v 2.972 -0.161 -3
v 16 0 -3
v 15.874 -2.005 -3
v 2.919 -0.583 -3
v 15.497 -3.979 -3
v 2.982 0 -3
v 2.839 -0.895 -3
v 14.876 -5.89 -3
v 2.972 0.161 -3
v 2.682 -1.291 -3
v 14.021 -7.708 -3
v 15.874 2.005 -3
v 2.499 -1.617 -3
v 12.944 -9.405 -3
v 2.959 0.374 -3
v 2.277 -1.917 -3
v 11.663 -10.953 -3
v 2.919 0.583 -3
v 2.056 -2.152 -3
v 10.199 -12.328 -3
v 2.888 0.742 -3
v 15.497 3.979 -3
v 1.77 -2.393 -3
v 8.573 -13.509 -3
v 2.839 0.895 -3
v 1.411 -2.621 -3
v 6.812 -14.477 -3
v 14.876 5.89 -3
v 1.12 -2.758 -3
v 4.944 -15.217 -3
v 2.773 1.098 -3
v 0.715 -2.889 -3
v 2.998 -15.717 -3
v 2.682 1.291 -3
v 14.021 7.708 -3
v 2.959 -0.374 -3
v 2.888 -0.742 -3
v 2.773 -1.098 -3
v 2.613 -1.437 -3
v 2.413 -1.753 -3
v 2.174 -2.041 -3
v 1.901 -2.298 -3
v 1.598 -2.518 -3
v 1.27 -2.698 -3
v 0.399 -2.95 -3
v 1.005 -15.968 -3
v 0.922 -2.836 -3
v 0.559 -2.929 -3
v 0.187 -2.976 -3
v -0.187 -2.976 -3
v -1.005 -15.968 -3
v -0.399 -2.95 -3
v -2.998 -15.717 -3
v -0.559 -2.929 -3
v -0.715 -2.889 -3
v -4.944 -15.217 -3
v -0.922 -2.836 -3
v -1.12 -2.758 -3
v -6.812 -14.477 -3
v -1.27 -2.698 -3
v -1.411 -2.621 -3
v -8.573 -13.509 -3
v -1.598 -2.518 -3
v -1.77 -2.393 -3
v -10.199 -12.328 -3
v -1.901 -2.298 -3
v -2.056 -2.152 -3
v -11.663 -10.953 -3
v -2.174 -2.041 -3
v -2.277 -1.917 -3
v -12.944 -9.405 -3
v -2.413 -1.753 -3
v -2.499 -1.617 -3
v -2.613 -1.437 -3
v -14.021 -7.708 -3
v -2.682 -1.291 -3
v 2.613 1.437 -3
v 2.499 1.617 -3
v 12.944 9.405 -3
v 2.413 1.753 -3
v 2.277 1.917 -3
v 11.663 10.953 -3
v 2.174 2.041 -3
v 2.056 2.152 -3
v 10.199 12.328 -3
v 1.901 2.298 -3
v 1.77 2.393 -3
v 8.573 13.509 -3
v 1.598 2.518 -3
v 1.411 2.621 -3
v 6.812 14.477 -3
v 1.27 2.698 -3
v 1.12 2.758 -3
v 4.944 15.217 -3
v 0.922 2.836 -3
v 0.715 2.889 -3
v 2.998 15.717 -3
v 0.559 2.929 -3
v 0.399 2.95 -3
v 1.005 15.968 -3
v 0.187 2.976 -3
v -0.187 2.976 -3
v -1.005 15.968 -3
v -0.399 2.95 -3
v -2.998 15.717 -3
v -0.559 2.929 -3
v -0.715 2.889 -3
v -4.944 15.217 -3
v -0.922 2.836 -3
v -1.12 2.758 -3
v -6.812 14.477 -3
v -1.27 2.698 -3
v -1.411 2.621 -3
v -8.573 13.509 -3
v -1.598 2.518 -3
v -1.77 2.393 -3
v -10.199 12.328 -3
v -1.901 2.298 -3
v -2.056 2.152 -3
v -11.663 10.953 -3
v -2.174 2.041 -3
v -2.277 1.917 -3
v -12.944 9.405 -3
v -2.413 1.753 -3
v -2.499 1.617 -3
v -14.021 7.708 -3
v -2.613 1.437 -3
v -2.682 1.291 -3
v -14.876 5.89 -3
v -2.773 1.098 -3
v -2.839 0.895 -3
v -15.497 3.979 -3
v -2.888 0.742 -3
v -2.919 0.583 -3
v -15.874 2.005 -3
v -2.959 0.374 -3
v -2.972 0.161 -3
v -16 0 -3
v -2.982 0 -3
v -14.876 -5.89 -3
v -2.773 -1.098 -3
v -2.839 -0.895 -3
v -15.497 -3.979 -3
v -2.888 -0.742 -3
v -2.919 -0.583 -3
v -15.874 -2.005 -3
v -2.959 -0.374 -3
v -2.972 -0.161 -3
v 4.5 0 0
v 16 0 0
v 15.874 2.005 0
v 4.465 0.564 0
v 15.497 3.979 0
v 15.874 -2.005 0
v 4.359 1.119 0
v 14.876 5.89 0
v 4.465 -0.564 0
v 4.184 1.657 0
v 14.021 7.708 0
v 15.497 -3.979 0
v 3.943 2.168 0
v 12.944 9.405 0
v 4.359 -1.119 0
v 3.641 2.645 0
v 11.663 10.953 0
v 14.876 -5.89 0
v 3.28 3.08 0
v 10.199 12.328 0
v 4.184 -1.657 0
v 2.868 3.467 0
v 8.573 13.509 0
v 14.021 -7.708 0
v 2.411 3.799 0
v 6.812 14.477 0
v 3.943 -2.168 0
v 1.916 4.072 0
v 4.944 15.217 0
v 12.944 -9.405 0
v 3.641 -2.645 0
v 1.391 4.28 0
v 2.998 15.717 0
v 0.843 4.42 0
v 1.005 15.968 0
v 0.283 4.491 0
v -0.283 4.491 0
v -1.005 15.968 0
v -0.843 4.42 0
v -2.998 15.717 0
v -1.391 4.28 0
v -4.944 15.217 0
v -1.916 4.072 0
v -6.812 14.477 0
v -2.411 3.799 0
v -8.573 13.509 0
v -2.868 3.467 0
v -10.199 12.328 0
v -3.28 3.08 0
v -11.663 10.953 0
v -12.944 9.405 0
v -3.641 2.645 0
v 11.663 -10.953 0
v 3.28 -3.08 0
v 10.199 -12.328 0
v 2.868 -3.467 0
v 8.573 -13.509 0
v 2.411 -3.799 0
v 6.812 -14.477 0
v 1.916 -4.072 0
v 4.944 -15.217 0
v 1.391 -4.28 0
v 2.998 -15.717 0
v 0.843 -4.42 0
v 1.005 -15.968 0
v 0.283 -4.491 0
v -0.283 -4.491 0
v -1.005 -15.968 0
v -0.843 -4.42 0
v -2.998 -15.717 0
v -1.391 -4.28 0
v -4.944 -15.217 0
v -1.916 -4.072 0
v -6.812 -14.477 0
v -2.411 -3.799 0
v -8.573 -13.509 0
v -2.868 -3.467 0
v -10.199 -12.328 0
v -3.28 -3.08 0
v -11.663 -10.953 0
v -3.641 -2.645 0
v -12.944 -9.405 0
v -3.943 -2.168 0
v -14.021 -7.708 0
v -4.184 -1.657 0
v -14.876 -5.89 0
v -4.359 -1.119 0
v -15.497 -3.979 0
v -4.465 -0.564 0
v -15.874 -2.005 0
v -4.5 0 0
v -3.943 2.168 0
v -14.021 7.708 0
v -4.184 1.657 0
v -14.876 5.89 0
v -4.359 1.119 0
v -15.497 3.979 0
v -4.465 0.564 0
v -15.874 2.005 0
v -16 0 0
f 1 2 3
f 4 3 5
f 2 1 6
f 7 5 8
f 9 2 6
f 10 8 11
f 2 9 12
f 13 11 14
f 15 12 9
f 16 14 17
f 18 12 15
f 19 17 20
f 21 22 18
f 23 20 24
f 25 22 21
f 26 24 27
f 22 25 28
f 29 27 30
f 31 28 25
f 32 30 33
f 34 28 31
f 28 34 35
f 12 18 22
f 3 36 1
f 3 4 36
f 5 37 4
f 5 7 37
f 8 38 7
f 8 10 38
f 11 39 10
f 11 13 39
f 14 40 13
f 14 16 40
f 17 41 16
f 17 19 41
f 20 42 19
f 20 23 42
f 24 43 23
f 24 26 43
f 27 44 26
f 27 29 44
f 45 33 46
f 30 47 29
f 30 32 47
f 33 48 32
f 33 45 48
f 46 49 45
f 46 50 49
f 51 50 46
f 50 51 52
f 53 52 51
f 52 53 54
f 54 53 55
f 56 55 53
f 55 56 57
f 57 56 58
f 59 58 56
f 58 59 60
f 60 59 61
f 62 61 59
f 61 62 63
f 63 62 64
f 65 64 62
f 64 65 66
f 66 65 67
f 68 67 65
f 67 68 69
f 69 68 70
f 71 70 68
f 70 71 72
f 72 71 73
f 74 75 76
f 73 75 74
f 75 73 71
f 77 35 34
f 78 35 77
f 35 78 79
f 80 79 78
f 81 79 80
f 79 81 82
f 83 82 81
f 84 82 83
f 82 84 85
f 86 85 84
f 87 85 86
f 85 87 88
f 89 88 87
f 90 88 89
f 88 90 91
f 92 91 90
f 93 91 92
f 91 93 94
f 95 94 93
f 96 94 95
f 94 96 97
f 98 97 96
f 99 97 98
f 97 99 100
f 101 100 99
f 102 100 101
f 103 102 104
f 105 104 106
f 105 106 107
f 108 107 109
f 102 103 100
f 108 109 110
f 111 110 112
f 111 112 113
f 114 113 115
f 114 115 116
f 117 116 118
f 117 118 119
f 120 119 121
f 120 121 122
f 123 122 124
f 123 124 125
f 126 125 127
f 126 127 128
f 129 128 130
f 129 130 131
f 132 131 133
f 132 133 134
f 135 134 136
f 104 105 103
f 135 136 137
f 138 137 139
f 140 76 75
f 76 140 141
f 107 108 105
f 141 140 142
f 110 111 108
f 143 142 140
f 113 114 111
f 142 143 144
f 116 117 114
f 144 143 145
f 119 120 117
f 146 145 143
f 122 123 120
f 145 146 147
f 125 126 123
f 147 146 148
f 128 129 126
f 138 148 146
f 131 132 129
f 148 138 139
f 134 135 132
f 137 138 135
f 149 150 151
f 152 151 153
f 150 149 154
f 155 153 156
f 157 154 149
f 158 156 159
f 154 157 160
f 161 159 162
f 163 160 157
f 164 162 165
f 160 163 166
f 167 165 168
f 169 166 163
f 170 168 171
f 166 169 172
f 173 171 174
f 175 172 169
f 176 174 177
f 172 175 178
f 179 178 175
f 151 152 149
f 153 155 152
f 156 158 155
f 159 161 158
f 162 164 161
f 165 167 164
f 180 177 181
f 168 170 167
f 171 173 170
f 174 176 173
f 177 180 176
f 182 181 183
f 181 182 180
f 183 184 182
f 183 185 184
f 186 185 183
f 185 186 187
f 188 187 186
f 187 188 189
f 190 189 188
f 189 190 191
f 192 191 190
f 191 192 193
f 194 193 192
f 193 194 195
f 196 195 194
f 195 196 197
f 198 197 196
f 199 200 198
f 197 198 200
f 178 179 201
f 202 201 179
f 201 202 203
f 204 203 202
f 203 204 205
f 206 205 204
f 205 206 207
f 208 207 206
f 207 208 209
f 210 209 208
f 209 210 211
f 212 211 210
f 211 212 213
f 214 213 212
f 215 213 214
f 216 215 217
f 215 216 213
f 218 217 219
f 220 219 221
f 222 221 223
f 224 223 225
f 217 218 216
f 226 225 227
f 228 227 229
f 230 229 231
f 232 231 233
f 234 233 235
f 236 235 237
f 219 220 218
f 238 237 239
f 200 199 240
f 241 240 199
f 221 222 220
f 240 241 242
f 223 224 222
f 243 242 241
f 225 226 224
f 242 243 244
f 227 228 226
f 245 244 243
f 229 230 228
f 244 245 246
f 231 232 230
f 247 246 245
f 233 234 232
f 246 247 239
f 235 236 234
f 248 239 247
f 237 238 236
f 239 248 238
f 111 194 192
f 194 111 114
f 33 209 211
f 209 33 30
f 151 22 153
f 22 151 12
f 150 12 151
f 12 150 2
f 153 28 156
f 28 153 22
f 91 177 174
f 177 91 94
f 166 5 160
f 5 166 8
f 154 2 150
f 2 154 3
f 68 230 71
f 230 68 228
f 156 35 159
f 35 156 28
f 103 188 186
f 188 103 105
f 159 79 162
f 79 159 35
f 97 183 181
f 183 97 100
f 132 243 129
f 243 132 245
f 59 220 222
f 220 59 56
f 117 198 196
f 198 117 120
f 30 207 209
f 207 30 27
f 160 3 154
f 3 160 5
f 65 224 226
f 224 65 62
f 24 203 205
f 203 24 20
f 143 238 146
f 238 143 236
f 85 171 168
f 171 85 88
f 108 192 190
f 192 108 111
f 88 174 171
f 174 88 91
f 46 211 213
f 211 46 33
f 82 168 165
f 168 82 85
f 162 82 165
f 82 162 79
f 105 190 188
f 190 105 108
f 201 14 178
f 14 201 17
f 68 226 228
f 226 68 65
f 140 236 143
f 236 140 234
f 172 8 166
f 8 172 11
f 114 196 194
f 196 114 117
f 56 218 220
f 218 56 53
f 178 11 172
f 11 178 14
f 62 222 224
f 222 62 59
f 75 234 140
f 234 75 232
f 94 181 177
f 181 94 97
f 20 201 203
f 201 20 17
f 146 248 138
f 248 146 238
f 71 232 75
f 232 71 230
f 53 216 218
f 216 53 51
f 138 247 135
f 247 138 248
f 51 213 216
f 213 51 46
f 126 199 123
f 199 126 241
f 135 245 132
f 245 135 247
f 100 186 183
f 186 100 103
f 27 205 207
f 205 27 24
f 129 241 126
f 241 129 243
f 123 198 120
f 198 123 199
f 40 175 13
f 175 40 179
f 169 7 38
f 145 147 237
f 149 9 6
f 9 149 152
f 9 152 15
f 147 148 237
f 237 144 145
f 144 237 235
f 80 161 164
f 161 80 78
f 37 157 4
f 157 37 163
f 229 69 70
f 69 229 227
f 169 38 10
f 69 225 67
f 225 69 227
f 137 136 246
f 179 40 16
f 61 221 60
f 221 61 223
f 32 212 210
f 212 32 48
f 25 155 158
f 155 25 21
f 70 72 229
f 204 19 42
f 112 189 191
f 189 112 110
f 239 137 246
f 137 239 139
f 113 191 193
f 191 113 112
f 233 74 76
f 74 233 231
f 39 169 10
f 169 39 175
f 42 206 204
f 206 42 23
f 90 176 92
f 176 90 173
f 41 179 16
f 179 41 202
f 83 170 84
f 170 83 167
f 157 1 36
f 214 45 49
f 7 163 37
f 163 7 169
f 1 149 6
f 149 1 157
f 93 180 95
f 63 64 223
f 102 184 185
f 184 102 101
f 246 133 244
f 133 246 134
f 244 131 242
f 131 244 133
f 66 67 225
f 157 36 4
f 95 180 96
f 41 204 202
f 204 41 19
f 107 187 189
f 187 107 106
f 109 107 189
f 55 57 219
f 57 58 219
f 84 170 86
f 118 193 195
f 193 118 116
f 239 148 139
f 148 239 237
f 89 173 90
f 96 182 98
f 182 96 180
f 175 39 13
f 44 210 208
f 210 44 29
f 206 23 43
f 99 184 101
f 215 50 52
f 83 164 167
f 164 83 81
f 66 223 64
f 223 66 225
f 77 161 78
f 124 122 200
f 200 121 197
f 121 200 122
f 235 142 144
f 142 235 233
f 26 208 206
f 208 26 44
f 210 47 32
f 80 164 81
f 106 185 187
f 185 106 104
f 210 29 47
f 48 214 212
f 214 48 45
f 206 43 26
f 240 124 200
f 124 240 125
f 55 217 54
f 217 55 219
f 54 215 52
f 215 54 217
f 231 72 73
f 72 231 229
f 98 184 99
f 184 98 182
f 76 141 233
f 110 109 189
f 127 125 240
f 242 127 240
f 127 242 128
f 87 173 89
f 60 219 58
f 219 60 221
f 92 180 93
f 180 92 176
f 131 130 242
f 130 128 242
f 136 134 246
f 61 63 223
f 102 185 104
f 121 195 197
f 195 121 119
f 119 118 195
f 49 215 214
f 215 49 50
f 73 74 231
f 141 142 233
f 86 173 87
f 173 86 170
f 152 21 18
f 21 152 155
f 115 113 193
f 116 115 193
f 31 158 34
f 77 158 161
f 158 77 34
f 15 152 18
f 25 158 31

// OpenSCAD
$fn = 50;


difference() {
	union() {
		translate(v = [0, 0, -3.0000000000]) {
			cylinder(h = 3, r = 10.0000000000);
		}
		translate(v = [0, 0, -3.0000000000]) {
			cylinder(h = 3, r = 16.0000000000);
		}
	}
	union() {
		translate(v = [0, 0, 0]) {
			rotate(a = [0, 0, 0]) {
				difference() {
					union() {
						#translate(v = [0, 0, -3.0000000000]) {
							cylinder(h = 3, r = 2.2500000000);
						}
						#translate(v = [0, 0, -4.2000000000]) {
							cylinder(h = 4.2000000000, r1 = 2.3750000000, r2 = 4.5000000000);
						}
						#translate(v = [0, 0, -3.0000000000]) {
							cylinder(h = 3, r = 2.3750000000);
						}
						#translate(v = [0, 0, -3.0000000000]) {
							cylinder(h = 3, r = 2.2500000000);
						}
					}
					union();
				}
			}
		}
	}
}
